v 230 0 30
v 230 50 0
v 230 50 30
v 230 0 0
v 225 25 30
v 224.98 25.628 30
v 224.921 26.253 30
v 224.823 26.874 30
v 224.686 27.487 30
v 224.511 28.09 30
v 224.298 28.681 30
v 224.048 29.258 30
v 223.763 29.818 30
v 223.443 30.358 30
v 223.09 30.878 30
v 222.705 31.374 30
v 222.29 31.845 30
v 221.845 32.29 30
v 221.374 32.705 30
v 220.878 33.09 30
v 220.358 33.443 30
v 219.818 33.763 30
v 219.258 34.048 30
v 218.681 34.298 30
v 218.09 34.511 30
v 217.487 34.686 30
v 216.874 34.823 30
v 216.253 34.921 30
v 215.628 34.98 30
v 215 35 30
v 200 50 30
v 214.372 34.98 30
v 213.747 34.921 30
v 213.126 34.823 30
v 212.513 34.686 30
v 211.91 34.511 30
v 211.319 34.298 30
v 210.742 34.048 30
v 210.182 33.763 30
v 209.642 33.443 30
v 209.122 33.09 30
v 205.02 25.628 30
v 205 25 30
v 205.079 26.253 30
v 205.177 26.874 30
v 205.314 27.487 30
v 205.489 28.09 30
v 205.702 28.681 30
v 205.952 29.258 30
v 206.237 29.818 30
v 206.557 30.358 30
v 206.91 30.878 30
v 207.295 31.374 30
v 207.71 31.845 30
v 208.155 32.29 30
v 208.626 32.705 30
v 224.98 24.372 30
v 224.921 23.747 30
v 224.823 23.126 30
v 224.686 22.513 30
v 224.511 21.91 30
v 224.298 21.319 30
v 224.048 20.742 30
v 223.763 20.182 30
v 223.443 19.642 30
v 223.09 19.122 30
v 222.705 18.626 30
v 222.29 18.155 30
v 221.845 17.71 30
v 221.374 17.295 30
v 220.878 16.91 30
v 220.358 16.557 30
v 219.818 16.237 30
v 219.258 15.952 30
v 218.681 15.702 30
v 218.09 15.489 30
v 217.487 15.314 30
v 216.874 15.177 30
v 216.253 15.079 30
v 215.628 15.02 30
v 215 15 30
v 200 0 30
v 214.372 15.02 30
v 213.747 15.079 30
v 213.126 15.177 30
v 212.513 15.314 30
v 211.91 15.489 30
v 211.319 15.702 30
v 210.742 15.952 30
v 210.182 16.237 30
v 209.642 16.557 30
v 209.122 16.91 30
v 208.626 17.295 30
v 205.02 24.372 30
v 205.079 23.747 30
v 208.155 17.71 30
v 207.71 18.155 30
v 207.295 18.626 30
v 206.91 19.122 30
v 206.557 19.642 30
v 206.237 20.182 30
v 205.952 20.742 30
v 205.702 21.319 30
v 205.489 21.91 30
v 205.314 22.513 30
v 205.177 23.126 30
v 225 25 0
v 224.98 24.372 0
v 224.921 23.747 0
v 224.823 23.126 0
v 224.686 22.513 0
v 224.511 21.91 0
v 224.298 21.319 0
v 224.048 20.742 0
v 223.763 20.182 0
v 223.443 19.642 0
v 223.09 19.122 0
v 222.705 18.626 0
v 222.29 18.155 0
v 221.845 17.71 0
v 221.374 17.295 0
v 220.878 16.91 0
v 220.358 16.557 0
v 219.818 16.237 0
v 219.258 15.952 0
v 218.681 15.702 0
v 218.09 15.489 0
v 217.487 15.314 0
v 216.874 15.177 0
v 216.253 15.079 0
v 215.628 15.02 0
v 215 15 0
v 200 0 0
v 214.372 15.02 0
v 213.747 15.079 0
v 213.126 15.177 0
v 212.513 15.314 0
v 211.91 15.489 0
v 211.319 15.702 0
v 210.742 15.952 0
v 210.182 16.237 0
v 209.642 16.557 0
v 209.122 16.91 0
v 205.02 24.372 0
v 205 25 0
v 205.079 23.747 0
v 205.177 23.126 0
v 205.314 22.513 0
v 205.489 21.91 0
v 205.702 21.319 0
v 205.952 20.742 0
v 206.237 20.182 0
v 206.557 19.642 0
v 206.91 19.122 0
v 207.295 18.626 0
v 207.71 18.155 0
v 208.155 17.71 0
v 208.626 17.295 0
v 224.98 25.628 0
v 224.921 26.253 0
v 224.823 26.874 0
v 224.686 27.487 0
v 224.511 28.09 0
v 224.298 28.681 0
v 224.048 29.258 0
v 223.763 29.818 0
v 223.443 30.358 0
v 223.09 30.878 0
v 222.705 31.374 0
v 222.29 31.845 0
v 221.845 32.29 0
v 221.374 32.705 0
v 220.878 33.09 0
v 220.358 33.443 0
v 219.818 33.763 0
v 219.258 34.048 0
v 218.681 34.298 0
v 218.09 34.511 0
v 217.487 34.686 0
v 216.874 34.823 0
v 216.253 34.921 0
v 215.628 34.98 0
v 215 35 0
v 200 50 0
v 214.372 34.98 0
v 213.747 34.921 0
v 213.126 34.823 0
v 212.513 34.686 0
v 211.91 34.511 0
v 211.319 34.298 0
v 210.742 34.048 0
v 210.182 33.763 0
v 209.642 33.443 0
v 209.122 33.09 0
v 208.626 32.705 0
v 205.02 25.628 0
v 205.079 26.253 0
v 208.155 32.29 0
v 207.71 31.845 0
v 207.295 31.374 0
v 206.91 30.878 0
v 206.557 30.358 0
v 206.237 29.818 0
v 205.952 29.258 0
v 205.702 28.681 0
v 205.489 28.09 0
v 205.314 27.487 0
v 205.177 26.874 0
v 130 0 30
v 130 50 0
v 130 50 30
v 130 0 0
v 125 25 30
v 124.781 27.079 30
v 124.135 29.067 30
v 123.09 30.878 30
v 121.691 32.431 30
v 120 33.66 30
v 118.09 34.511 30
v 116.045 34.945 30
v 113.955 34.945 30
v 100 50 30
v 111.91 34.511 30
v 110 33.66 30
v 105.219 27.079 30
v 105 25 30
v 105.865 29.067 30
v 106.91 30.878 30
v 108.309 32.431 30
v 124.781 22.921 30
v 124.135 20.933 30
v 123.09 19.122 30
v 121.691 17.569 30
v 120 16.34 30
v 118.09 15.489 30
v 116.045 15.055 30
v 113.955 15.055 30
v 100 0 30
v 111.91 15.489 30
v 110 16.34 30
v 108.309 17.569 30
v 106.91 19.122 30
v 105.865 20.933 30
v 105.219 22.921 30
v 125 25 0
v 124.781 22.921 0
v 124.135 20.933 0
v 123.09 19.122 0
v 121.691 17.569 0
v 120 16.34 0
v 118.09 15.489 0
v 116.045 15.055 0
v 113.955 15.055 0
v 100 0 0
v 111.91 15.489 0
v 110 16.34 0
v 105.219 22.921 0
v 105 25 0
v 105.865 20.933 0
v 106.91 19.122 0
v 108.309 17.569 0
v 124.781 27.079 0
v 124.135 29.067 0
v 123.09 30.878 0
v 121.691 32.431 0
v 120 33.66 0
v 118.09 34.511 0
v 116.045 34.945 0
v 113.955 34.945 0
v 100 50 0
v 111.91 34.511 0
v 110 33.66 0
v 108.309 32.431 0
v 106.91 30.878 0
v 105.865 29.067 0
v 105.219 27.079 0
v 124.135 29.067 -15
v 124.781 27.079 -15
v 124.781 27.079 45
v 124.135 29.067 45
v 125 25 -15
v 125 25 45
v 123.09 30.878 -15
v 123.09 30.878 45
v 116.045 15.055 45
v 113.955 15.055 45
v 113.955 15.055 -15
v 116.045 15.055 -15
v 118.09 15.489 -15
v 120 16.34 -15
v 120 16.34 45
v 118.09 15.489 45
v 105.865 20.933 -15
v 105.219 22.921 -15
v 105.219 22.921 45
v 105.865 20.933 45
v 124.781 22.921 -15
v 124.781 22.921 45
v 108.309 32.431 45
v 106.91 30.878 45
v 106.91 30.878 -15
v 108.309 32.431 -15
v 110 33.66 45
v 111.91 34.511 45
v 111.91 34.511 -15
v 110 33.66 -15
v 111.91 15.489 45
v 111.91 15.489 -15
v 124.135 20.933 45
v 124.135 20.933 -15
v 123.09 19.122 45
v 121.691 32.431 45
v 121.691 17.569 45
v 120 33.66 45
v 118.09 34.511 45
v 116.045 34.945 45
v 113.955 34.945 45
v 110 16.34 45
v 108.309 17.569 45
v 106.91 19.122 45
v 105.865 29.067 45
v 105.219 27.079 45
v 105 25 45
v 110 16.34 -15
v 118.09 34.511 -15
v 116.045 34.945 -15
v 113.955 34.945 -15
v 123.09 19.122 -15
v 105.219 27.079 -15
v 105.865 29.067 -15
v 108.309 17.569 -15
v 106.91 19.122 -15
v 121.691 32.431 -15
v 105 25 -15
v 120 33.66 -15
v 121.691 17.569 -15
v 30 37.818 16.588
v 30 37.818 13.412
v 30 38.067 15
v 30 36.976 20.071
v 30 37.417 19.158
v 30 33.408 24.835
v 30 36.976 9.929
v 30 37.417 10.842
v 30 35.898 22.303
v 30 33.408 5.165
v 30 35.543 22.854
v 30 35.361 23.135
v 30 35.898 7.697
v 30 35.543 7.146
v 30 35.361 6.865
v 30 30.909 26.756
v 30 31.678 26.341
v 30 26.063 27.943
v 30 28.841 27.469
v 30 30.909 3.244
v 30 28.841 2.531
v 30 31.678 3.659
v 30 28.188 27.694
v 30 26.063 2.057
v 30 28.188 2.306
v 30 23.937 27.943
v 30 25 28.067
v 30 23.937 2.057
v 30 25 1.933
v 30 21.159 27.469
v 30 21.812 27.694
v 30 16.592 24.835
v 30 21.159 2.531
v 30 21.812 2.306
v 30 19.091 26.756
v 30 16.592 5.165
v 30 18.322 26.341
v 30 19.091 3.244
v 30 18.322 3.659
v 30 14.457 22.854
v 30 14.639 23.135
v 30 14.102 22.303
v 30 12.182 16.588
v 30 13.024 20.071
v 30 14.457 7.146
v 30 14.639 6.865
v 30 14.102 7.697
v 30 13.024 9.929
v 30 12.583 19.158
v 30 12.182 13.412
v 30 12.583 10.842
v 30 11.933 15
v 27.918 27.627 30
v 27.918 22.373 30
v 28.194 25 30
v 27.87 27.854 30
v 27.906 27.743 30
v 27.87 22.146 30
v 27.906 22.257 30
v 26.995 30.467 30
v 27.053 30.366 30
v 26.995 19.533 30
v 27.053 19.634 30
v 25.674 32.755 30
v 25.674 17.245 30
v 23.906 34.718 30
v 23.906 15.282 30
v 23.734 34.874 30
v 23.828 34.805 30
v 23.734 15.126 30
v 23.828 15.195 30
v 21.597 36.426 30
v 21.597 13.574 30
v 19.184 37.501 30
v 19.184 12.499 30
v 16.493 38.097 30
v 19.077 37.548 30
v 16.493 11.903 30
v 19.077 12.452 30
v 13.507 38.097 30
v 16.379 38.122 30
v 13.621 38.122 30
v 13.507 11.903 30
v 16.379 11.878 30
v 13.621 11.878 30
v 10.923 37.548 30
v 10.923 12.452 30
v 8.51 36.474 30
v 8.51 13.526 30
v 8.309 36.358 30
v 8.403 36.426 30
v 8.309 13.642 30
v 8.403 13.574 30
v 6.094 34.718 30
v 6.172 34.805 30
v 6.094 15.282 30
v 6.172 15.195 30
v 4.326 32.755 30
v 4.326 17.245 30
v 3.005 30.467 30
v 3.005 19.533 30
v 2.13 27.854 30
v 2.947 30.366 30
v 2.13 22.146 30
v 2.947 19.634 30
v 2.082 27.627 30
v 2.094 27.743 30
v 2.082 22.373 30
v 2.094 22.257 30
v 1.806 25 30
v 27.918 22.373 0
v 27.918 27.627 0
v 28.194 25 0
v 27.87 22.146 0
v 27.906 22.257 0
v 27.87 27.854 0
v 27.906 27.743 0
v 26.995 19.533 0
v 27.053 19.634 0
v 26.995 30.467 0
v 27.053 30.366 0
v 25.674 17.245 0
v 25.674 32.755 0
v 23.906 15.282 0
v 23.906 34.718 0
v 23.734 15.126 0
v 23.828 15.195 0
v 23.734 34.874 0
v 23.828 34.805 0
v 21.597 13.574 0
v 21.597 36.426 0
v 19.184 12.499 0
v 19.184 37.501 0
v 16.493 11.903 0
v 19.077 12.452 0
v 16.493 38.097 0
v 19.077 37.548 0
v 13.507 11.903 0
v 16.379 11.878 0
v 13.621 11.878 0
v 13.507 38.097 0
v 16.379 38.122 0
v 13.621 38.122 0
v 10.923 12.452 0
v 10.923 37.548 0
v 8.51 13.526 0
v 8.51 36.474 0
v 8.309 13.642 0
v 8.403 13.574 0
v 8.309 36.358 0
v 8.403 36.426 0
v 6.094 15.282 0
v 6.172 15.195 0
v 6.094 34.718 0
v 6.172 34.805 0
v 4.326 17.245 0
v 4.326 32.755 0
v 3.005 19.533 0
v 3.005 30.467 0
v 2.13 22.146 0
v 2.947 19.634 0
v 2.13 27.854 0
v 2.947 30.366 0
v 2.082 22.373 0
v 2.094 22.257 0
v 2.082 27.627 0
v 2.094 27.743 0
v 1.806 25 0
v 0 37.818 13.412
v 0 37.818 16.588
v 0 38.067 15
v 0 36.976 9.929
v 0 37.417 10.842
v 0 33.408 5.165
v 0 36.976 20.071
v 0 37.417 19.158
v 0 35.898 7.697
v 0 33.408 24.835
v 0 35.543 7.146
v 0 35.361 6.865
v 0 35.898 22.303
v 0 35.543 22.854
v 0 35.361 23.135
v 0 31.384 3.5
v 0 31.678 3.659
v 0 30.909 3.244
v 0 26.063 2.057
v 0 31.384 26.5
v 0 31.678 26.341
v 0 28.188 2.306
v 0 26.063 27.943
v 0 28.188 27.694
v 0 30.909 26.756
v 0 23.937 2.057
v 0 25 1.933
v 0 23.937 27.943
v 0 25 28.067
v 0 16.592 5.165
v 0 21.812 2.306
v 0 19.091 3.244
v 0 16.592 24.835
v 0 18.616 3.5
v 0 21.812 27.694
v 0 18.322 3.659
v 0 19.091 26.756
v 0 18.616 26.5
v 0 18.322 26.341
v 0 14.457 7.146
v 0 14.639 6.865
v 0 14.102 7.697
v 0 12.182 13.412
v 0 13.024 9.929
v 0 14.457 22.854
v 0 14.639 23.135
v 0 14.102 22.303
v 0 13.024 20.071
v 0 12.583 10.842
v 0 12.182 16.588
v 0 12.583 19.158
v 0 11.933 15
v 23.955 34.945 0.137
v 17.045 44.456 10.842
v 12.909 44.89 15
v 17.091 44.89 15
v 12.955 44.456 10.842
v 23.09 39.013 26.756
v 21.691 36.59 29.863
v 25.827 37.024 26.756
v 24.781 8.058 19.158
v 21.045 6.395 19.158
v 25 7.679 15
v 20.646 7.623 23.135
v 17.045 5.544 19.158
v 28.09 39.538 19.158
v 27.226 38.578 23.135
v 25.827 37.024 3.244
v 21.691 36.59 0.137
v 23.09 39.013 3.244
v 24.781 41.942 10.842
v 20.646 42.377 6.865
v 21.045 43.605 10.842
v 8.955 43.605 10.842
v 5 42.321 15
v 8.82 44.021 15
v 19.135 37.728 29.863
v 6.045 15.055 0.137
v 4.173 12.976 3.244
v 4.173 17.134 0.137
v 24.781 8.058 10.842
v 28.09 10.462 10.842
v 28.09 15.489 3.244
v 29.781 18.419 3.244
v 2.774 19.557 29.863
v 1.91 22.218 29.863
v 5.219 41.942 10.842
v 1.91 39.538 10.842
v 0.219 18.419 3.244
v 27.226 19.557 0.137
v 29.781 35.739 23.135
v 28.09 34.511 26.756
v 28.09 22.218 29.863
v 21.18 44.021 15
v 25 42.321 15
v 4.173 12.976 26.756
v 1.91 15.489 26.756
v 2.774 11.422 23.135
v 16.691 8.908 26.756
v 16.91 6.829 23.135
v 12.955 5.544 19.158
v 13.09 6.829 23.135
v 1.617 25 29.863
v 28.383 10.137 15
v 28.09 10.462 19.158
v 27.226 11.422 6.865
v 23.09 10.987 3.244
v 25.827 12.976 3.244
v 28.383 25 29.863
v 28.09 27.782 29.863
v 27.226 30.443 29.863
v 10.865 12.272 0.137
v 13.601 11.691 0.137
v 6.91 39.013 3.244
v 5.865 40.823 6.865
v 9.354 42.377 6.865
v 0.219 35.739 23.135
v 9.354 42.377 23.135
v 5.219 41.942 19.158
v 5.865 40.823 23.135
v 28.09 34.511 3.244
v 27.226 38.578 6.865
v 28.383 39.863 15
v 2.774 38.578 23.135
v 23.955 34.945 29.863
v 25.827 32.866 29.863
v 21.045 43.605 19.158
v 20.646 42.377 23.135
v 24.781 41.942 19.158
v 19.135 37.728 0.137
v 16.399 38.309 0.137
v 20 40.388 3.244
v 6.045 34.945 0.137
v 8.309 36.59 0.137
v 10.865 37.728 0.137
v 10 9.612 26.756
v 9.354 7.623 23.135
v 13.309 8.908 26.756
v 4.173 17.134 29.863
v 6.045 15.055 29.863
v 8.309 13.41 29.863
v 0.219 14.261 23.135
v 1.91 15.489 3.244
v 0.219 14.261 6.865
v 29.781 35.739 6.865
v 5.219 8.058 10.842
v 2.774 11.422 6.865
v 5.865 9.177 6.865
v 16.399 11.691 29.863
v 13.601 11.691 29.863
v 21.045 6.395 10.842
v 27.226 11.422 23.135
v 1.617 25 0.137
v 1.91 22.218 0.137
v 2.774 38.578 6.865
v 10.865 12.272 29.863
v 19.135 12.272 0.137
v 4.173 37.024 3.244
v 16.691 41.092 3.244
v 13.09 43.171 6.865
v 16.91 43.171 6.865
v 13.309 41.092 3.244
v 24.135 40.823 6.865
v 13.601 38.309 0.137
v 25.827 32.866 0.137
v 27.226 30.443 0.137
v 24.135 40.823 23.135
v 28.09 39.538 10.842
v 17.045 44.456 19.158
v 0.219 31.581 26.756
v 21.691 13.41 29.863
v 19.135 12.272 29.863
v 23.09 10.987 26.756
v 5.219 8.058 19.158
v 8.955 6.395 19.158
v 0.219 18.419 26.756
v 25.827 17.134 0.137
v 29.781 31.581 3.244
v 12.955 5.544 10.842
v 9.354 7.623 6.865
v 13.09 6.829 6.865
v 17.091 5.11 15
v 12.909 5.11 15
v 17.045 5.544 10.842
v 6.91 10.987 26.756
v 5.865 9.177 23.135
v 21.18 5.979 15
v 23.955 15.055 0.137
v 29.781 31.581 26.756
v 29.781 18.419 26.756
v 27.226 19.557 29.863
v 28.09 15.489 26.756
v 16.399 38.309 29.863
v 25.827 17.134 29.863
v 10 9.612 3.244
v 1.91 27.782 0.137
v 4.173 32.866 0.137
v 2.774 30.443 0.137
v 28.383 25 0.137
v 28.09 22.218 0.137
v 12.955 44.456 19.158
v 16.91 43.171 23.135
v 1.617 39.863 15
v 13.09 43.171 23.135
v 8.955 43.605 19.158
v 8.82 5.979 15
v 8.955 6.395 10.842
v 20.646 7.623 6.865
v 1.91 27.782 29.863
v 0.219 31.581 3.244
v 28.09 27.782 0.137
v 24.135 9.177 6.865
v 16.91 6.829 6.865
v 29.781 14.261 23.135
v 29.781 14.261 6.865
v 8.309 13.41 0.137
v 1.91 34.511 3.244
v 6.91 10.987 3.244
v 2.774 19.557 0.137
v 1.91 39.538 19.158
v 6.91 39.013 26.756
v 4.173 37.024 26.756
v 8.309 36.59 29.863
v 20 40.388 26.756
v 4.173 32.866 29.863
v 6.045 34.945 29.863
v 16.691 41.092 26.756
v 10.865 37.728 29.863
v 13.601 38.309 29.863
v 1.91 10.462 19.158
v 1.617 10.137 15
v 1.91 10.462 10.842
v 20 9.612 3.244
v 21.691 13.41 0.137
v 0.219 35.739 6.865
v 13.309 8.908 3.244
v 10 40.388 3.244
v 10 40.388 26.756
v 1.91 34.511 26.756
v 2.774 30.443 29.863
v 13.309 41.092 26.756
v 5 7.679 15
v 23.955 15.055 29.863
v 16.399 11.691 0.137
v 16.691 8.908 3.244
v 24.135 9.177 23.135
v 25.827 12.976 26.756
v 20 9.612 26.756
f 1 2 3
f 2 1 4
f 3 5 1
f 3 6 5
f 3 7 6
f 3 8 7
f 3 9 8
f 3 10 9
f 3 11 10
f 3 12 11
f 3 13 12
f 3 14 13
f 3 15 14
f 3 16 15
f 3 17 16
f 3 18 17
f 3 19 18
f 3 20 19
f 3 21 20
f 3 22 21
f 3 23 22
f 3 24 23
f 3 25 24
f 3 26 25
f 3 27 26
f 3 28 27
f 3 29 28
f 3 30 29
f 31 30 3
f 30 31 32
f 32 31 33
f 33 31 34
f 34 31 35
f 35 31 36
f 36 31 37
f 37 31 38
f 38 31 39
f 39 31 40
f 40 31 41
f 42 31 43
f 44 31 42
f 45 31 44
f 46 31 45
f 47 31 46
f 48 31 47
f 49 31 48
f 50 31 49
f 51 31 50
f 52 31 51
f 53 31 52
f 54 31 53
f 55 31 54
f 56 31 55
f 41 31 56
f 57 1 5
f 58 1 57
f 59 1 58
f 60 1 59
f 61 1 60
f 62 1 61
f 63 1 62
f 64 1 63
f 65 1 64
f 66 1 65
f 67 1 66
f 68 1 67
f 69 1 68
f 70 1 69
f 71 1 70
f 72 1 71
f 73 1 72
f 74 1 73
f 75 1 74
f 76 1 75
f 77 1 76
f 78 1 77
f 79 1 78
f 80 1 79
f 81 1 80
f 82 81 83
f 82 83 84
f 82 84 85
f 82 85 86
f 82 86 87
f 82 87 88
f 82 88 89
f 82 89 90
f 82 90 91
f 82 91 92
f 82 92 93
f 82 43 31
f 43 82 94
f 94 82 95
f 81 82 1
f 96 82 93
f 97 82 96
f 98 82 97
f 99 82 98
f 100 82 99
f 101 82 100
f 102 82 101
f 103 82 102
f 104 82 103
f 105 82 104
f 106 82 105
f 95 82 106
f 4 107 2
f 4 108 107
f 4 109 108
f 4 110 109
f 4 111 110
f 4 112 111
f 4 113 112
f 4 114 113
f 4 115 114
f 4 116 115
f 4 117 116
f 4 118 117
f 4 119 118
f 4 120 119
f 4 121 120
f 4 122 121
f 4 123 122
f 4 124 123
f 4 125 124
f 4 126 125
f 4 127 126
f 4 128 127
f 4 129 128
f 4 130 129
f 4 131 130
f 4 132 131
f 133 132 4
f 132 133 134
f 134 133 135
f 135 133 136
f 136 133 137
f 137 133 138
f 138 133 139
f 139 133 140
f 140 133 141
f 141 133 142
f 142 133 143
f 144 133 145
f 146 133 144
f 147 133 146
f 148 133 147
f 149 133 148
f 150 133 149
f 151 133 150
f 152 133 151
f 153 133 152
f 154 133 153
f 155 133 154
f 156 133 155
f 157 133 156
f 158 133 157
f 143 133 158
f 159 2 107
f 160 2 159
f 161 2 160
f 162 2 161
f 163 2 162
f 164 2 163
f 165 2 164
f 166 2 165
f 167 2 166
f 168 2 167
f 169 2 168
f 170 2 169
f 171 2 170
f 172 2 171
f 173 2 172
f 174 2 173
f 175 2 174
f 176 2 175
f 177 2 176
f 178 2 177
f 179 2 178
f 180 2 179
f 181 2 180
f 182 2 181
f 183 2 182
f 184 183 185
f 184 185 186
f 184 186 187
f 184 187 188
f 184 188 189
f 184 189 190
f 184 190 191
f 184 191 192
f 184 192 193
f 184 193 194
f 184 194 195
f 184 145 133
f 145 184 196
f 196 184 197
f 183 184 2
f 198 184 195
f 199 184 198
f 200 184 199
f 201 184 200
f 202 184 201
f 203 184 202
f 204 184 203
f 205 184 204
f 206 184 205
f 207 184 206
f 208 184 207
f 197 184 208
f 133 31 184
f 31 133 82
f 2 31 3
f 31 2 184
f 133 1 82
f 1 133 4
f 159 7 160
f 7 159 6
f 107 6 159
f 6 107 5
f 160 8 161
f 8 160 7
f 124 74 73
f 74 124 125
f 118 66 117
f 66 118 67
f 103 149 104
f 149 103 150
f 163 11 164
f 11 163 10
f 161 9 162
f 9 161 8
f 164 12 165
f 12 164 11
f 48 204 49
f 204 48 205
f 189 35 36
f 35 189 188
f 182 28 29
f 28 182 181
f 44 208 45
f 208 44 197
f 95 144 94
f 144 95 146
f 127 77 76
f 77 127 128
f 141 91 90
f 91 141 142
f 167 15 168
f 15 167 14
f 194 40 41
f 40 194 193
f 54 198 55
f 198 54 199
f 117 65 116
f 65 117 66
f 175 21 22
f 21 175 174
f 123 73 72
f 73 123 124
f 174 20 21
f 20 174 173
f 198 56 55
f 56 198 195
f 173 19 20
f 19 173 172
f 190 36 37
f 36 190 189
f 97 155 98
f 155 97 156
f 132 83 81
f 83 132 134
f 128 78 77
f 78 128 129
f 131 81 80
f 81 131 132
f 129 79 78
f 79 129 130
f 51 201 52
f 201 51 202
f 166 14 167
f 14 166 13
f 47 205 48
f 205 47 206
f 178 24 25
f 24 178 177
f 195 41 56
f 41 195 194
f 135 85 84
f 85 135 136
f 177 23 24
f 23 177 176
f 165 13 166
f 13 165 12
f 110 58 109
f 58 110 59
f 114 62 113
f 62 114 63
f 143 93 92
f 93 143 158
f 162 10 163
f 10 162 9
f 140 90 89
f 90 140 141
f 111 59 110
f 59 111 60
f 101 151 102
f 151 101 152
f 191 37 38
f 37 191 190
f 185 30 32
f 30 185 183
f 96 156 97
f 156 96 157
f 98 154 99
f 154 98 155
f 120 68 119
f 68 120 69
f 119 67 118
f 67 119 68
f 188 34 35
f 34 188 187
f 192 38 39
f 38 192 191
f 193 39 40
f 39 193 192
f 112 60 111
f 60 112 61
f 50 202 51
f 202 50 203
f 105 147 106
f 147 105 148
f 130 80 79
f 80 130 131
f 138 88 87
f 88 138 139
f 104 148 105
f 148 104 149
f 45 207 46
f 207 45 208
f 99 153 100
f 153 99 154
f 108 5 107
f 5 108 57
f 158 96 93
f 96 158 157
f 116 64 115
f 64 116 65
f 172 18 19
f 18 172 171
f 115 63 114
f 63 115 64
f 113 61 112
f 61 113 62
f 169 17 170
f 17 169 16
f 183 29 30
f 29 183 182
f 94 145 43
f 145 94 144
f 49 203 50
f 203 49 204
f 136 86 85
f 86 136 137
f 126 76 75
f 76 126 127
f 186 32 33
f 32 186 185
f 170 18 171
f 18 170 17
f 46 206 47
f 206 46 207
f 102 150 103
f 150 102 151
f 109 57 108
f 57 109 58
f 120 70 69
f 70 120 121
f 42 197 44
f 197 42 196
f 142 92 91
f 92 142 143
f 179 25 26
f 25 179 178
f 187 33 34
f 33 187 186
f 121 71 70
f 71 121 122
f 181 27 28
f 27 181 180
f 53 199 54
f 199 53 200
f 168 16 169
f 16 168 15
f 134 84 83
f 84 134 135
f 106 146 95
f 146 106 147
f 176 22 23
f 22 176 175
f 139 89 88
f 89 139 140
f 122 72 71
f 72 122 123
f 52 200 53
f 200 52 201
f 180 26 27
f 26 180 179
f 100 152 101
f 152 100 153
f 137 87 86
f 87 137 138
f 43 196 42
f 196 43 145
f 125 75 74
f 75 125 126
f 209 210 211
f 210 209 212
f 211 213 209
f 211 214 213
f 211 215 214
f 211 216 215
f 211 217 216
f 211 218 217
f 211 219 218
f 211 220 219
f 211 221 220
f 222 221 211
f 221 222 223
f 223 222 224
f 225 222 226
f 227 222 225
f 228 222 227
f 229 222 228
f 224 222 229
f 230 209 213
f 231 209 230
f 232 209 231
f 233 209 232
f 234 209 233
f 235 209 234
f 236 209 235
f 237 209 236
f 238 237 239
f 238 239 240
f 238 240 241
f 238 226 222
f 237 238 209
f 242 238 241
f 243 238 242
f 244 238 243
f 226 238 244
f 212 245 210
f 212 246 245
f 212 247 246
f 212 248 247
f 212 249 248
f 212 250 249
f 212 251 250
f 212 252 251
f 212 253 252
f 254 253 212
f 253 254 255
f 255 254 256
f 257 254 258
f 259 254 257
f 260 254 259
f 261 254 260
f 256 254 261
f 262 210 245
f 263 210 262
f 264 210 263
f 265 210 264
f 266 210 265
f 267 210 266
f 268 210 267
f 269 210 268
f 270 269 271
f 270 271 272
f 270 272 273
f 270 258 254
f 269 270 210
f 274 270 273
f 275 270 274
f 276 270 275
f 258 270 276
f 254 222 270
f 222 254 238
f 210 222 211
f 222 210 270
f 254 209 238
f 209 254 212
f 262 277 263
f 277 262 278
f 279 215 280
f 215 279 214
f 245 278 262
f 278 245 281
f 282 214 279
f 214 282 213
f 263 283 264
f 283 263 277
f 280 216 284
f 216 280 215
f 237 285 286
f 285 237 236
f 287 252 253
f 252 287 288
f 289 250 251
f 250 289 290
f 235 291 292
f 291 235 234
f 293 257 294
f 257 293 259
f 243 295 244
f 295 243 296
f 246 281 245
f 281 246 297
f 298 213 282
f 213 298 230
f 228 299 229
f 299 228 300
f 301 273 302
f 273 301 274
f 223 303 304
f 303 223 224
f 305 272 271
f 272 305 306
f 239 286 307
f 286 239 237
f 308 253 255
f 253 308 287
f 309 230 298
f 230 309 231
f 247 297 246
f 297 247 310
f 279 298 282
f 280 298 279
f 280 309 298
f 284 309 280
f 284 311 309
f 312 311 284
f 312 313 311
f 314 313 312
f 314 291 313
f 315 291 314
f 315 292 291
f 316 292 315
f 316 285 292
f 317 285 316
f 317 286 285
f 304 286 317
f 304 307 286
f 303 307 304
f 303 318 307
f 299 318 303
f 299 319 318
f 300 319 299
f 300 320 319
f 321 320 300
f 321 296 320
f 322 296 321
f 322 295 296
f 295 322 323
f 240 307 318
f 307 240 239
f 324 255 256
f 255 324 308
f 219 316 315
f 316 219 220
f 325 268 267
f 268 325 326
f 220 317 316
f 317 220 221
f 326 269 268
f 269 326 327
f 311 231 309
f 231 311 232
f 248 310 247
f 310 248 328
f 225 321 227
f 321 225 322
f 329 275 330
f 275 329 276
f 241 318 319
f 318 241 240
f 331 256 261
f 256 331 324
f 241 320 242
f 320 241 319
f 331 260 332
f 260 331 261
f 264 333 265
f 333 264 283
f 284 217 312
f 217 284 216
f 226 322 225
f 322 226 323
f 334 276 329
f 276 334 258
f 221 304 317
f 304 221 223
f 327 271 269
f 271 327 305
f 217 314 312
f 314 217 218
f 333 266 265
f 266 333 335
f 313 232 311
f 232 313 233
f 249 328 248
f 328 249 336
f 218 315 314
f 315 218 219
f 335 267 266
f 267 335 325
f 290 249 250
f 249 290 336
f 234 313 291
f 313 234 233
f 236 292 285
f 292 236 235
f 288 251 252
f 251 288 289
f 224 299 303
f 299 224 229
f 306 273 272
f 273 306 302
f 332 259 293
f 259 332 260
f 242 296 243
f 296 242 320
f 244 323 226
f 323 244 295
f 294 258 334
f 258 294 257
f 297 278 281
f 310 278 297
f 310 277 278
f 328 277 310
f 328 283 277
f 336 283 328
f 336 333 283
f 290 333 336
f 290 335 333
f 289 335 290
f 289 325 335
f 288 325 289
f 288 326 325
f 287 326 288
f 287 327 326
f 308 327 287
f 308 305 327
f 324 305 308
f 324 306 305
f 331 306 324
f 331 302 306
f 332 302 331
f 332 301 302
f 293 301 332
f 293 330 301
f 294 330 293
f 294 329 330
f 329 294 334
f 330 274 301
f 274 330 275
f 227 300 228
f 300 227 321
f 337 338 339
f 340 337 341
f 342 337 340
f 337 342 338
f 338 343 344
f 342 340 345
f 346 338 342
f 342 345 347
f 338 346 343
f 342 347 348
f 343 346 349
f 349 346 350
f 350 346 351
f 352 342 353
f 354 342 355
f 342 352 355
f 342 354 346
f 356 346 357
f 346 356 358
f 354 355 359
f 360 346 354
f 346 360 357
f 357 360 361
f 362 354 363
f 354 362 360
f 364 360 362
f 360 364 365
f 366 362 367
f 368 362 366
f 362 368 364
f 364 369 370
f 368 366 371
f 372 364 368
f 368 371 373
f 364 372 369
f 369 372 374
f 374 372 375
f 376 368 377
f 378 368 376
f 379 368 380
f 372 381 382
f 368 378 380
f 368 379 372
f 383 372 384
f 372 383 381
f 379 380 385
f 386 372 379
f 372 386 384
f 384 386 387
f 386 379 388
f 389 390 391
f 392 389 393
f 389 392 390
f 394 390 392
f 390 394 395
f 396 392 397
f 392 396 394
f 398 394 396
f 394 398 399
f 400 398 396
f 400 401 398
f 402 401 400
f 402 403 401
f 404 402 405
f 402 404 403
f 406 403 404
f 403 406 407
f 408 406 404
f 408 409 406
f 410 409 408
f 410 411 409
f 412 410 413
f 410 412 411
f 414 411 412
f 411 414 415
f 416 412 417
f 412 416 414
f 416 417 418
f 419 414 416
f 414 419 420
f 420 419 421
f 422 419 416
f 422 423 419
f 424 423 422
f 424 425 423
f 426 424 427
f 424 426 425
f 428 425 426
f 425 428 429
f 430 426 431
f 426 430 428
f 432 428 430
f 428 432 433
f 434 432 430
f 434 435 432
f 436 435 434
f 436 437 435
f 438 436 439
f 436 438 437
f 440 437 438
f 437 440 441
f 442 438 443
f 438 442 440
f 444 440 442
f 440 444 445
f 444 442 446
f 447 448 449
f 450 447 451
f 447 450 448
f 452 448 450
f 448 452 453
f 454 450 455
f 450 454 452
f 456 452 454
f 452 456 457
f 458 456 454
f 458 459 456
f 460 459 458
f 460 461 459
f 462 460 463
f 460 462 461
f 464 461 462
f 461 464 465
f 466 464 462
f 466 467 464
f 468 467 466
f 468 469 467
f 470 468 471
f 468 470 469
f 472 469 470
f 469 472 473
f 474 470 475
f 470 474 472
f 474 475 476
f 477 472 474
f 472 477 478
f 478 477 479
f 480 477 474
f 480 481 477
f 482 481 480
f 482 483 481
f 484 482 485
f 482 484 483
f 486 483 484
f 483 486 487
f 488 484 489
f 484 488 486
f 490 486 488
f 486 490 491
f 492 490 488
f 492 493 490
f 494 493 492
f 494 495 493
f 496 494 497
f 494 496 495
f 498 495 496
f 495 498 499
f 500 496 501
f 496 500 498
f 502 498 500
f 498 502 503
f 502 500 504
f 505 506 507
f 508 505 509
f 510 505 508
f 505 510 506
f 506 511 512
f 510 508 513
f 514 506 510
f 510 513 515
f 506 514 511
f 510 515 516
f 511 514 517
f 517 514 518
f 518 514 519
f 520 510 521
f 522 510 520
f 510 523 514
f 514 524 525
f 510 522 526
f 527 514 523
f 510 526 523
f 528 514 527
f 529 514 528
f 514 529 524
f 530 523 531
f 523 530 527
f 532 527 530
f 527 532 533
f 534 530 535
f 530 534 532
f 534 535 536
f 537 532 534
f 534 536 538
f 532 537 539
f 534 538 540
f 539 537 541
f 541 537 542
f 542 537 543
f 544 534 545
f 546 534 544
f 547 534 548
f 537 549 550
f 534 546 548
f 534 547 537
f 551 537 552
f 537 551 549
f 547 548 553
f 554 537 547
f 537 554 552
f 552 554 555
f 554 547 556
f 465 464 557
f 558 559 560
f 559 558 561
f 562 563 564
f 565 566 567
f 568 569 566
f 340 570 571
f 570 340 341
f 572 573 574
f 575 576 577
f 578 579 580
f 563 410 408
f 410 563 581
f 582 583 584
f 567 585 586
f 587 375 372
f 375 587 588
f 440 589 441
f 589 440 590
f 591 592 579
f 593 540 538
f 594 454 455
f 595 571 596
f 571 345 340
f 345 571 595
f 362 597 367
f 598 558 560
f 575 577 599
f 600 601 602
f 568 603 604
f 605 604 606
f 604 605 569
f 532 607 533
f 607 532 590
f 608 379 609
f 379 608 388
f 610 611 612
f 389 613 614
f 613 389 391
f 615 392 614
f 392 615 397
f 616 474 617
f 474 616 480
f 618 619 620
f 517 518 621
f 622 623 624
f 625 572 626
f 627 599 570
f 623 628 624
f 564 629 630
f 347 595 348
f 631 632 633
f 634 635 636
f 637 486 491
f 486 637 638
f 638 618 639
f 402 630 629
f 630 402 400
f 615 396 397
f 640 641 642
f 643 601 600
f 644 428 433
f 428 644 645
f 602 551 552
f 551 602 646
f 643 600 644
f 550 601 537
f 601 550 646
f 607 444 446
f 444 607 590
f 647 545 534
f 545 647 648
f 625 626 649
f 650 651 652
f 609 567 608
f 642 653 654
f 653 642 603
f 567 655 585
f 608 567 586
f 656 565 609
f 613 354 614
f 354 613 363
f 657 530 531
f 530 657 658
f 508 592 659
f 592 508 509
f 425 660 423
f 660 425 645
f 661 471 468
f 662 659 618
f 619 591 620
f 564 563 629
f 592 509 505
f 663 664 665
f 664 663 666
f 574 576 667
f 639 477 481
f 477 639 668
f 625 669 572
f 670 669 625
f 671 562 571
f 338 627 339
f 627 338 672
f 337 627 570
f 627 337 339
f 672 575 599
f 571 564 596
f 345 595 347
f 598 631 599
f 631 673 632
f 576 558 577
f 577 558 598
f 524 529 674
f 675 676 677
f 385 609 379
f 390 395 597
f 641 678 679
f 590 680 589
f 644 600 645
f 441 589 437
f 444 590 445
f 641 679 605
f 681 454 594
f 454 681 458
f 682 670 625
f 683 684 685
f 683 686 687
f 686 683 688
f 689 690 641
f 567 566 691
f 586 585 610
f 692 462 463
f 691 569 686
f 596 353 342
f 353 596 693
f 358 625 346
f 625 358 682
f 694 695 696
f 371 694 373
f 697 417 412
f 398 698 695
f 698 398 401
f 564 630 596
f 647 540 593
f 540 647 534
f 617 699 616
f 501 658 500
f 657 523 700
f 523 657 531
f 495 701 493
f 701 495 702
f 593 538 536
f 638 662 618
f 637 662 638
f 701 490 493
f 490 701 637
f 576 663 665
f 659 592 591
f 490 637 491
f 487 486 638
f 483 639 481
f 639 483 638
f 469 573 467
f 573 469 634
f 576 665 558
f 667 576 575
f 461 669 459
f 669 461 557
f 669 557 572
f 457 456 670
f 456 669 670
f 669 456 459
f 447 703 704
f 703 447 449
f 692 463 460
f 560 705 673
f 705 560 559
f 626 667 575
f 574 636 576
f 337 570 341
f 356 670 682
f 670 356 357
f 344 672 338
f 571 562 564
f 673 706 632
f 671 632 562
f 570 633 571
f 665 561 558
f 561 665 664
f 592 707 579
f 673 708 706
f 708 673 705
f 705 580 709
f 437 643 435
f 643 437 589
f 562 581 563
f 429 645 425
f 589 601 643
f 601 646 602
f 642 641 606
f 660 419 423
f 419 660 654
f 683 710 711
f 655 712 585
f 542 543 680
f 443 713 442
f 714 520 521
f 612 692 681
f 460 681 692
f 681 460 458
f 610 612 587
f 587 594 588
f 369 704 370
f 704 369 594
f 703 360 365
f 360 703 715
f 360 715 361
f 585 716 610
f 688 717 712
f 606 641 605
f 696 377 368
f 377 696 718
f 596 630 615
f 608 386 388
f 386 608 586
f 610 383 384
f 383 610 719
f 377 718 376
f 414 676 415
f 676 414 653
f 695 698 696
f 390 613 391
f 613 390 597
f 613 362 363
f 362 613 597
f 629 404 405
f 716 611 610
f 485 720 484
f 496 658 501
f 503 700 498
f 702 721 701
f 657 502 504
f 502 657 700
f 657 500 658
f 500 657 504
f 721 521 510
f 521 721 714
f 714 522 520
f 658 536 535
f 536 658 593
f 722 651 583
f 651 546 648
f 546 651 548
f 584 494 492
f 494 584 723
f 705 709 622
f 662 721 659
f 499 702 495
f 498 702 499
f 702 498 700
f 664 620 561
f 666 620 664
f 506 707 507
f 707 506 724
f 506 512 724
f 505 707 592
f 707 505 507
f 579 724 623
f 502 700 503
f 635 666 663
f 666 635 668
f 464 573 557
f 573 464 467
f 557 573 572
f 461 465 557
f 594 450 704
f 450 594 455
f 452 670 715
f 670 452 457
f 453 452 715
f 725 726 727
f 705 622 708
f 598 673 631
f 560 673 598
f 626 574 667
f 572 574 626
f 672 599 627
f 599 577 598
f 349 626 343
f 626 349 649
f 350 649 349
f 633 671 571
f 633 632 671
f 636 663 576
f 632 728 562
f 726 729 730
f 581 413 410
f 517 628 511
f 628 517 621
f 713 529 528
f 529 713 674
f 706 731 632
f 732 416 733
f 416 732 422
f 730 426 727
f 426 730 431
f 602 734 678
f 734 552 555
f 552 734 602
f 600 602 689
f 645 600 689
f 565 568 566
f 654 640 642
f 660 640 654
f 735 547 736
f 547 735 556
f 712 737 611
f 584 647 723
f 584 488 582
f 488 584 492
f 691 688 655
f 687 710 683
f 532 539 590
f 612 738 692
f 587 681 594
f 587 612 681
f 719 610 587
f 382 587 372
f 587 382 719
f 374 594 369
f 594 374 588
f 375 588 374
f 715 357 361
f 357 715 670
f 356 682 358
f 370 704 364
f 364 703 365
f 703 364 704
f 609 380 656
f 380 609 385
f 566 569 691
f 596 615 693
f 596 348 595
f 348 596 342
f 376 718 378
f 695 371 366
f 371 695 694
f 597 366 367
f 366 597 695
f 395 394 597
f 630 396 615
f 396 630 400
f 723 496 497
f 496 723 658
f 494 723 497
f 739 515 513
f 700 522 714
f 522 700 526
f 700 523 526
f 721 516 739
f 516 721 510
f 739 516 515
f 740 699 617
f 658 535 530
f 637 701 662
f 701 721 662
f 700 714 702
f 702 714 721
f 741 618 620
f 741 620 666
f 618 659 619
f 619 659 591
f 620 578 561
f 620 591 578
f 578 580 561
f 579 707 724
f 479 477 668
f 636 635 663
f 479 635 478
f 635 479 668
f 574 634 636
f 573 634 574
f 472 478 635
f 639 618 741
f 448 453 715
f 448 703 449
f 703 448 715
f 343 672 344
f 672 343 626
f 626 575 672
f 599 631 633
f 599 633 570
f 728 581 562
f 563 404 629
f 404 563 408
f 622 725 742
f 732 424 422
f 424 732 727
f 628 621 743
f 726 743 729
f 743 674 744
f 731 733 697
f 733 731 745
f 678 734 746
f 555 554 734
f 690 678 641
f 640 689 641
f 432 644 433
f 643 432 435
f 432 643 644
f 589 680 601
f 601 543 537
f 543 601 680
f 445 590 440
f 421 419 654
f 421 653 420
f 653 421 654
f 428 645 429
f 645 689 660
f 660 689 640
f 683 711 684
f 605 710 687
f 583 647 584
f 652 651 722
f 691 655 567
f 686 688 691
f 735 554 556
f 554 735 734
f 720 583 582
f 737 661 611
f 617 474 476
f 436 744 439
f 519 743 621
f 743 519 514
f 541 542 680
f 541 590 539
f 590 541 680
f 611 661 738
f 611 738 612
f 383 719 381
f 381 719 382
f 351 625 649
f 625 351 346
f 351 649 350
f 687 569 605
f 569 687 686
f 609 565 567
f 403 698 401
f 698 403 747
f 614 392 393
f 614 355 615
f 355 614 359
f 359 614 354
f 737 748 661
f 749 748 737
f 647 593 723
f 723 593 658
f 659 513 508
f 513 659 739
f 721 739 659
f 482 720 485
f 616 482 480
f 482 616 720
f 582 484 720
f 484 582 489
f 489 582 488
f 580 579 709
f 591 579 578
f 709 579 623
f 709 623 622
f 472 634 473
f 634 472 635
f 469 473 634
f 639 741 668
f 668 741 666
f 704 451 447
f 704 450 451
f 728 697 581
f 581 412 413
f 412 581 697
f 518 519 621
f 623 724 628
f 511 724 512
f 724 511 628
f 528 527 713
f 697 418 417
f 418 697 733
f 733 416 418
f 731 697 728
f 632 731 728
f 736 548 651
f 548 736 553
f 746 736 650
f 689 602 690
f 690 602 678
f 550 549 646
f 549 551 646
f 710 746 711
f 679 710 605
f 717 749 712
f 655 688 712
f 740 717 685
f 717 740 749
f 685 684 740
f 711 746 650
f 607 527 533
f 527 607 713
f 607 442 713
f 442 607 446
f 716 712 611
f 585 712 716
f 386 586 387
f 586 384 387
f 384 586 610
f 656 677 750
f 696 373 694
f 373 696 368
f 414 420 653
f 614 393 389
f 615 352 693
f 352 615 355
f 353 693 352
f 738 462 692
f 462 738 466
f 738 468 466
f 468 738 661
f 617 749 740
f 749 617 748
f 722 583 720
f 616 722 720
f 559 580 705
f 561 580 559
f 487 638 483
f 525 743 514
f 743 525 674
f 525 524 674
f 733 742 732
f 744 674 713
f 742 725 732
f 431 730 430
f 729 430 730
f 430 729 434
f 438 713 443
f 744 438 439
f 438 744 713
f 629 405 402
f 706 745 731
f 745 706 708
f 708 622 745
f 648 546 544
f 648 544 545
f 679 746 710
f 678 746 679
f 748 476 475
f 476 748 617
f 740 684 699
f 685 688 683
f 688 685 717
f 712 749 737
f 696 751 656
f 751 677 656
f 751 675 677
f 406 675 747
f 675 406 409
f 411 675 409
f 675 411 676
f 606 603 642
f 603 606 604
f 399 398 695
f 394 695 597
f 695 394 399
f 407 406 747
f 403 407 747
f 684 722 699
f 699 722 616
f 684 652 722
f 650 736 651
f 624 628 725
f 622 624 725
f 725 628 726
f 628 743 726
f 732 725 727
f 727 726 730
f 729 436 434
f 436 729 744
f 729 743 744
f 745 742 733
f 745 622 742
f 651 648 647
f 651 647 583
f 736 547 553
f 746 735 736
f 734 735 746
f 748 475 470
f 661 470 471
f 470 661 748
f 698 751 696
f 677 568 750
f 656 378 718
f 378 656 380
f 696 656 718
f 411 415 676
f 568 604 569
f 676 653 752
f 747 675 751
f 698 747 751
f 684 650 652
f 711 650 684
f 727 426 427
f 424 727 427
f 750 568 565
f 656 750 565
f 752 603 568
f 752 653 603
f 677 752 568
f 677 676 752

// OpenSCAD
hammer_length= 300;
hammer_head_length = 100;

translate([200,0,0]) difference() {
    cube([30,50,30]);
    translate([15,25,15]) cylinder(r=10,h=60,center=true,$fn=100);
}


translate([100,0,0]) union() {
    cube([30,50,30]);
    translate([15,25,15]) cylinder(r=10,h=60,center=true,$fn=30);
}


intersection() {
    cube([30,50,30]);
    translate([15,25,15]) sphere(r=20,h=60,center=true);
}



















module hammer() {
// hammer handle
color("Brown")
    cylinder(r=10,h=hammer_length);

// hammer head

translate([0,0,hammer_length-16])
    color("Blue")
        difference() {
            
            cube([30,hammer_head_length,30],center=true);
            cylinder(r=10,h=31,center=true);
        }

}
